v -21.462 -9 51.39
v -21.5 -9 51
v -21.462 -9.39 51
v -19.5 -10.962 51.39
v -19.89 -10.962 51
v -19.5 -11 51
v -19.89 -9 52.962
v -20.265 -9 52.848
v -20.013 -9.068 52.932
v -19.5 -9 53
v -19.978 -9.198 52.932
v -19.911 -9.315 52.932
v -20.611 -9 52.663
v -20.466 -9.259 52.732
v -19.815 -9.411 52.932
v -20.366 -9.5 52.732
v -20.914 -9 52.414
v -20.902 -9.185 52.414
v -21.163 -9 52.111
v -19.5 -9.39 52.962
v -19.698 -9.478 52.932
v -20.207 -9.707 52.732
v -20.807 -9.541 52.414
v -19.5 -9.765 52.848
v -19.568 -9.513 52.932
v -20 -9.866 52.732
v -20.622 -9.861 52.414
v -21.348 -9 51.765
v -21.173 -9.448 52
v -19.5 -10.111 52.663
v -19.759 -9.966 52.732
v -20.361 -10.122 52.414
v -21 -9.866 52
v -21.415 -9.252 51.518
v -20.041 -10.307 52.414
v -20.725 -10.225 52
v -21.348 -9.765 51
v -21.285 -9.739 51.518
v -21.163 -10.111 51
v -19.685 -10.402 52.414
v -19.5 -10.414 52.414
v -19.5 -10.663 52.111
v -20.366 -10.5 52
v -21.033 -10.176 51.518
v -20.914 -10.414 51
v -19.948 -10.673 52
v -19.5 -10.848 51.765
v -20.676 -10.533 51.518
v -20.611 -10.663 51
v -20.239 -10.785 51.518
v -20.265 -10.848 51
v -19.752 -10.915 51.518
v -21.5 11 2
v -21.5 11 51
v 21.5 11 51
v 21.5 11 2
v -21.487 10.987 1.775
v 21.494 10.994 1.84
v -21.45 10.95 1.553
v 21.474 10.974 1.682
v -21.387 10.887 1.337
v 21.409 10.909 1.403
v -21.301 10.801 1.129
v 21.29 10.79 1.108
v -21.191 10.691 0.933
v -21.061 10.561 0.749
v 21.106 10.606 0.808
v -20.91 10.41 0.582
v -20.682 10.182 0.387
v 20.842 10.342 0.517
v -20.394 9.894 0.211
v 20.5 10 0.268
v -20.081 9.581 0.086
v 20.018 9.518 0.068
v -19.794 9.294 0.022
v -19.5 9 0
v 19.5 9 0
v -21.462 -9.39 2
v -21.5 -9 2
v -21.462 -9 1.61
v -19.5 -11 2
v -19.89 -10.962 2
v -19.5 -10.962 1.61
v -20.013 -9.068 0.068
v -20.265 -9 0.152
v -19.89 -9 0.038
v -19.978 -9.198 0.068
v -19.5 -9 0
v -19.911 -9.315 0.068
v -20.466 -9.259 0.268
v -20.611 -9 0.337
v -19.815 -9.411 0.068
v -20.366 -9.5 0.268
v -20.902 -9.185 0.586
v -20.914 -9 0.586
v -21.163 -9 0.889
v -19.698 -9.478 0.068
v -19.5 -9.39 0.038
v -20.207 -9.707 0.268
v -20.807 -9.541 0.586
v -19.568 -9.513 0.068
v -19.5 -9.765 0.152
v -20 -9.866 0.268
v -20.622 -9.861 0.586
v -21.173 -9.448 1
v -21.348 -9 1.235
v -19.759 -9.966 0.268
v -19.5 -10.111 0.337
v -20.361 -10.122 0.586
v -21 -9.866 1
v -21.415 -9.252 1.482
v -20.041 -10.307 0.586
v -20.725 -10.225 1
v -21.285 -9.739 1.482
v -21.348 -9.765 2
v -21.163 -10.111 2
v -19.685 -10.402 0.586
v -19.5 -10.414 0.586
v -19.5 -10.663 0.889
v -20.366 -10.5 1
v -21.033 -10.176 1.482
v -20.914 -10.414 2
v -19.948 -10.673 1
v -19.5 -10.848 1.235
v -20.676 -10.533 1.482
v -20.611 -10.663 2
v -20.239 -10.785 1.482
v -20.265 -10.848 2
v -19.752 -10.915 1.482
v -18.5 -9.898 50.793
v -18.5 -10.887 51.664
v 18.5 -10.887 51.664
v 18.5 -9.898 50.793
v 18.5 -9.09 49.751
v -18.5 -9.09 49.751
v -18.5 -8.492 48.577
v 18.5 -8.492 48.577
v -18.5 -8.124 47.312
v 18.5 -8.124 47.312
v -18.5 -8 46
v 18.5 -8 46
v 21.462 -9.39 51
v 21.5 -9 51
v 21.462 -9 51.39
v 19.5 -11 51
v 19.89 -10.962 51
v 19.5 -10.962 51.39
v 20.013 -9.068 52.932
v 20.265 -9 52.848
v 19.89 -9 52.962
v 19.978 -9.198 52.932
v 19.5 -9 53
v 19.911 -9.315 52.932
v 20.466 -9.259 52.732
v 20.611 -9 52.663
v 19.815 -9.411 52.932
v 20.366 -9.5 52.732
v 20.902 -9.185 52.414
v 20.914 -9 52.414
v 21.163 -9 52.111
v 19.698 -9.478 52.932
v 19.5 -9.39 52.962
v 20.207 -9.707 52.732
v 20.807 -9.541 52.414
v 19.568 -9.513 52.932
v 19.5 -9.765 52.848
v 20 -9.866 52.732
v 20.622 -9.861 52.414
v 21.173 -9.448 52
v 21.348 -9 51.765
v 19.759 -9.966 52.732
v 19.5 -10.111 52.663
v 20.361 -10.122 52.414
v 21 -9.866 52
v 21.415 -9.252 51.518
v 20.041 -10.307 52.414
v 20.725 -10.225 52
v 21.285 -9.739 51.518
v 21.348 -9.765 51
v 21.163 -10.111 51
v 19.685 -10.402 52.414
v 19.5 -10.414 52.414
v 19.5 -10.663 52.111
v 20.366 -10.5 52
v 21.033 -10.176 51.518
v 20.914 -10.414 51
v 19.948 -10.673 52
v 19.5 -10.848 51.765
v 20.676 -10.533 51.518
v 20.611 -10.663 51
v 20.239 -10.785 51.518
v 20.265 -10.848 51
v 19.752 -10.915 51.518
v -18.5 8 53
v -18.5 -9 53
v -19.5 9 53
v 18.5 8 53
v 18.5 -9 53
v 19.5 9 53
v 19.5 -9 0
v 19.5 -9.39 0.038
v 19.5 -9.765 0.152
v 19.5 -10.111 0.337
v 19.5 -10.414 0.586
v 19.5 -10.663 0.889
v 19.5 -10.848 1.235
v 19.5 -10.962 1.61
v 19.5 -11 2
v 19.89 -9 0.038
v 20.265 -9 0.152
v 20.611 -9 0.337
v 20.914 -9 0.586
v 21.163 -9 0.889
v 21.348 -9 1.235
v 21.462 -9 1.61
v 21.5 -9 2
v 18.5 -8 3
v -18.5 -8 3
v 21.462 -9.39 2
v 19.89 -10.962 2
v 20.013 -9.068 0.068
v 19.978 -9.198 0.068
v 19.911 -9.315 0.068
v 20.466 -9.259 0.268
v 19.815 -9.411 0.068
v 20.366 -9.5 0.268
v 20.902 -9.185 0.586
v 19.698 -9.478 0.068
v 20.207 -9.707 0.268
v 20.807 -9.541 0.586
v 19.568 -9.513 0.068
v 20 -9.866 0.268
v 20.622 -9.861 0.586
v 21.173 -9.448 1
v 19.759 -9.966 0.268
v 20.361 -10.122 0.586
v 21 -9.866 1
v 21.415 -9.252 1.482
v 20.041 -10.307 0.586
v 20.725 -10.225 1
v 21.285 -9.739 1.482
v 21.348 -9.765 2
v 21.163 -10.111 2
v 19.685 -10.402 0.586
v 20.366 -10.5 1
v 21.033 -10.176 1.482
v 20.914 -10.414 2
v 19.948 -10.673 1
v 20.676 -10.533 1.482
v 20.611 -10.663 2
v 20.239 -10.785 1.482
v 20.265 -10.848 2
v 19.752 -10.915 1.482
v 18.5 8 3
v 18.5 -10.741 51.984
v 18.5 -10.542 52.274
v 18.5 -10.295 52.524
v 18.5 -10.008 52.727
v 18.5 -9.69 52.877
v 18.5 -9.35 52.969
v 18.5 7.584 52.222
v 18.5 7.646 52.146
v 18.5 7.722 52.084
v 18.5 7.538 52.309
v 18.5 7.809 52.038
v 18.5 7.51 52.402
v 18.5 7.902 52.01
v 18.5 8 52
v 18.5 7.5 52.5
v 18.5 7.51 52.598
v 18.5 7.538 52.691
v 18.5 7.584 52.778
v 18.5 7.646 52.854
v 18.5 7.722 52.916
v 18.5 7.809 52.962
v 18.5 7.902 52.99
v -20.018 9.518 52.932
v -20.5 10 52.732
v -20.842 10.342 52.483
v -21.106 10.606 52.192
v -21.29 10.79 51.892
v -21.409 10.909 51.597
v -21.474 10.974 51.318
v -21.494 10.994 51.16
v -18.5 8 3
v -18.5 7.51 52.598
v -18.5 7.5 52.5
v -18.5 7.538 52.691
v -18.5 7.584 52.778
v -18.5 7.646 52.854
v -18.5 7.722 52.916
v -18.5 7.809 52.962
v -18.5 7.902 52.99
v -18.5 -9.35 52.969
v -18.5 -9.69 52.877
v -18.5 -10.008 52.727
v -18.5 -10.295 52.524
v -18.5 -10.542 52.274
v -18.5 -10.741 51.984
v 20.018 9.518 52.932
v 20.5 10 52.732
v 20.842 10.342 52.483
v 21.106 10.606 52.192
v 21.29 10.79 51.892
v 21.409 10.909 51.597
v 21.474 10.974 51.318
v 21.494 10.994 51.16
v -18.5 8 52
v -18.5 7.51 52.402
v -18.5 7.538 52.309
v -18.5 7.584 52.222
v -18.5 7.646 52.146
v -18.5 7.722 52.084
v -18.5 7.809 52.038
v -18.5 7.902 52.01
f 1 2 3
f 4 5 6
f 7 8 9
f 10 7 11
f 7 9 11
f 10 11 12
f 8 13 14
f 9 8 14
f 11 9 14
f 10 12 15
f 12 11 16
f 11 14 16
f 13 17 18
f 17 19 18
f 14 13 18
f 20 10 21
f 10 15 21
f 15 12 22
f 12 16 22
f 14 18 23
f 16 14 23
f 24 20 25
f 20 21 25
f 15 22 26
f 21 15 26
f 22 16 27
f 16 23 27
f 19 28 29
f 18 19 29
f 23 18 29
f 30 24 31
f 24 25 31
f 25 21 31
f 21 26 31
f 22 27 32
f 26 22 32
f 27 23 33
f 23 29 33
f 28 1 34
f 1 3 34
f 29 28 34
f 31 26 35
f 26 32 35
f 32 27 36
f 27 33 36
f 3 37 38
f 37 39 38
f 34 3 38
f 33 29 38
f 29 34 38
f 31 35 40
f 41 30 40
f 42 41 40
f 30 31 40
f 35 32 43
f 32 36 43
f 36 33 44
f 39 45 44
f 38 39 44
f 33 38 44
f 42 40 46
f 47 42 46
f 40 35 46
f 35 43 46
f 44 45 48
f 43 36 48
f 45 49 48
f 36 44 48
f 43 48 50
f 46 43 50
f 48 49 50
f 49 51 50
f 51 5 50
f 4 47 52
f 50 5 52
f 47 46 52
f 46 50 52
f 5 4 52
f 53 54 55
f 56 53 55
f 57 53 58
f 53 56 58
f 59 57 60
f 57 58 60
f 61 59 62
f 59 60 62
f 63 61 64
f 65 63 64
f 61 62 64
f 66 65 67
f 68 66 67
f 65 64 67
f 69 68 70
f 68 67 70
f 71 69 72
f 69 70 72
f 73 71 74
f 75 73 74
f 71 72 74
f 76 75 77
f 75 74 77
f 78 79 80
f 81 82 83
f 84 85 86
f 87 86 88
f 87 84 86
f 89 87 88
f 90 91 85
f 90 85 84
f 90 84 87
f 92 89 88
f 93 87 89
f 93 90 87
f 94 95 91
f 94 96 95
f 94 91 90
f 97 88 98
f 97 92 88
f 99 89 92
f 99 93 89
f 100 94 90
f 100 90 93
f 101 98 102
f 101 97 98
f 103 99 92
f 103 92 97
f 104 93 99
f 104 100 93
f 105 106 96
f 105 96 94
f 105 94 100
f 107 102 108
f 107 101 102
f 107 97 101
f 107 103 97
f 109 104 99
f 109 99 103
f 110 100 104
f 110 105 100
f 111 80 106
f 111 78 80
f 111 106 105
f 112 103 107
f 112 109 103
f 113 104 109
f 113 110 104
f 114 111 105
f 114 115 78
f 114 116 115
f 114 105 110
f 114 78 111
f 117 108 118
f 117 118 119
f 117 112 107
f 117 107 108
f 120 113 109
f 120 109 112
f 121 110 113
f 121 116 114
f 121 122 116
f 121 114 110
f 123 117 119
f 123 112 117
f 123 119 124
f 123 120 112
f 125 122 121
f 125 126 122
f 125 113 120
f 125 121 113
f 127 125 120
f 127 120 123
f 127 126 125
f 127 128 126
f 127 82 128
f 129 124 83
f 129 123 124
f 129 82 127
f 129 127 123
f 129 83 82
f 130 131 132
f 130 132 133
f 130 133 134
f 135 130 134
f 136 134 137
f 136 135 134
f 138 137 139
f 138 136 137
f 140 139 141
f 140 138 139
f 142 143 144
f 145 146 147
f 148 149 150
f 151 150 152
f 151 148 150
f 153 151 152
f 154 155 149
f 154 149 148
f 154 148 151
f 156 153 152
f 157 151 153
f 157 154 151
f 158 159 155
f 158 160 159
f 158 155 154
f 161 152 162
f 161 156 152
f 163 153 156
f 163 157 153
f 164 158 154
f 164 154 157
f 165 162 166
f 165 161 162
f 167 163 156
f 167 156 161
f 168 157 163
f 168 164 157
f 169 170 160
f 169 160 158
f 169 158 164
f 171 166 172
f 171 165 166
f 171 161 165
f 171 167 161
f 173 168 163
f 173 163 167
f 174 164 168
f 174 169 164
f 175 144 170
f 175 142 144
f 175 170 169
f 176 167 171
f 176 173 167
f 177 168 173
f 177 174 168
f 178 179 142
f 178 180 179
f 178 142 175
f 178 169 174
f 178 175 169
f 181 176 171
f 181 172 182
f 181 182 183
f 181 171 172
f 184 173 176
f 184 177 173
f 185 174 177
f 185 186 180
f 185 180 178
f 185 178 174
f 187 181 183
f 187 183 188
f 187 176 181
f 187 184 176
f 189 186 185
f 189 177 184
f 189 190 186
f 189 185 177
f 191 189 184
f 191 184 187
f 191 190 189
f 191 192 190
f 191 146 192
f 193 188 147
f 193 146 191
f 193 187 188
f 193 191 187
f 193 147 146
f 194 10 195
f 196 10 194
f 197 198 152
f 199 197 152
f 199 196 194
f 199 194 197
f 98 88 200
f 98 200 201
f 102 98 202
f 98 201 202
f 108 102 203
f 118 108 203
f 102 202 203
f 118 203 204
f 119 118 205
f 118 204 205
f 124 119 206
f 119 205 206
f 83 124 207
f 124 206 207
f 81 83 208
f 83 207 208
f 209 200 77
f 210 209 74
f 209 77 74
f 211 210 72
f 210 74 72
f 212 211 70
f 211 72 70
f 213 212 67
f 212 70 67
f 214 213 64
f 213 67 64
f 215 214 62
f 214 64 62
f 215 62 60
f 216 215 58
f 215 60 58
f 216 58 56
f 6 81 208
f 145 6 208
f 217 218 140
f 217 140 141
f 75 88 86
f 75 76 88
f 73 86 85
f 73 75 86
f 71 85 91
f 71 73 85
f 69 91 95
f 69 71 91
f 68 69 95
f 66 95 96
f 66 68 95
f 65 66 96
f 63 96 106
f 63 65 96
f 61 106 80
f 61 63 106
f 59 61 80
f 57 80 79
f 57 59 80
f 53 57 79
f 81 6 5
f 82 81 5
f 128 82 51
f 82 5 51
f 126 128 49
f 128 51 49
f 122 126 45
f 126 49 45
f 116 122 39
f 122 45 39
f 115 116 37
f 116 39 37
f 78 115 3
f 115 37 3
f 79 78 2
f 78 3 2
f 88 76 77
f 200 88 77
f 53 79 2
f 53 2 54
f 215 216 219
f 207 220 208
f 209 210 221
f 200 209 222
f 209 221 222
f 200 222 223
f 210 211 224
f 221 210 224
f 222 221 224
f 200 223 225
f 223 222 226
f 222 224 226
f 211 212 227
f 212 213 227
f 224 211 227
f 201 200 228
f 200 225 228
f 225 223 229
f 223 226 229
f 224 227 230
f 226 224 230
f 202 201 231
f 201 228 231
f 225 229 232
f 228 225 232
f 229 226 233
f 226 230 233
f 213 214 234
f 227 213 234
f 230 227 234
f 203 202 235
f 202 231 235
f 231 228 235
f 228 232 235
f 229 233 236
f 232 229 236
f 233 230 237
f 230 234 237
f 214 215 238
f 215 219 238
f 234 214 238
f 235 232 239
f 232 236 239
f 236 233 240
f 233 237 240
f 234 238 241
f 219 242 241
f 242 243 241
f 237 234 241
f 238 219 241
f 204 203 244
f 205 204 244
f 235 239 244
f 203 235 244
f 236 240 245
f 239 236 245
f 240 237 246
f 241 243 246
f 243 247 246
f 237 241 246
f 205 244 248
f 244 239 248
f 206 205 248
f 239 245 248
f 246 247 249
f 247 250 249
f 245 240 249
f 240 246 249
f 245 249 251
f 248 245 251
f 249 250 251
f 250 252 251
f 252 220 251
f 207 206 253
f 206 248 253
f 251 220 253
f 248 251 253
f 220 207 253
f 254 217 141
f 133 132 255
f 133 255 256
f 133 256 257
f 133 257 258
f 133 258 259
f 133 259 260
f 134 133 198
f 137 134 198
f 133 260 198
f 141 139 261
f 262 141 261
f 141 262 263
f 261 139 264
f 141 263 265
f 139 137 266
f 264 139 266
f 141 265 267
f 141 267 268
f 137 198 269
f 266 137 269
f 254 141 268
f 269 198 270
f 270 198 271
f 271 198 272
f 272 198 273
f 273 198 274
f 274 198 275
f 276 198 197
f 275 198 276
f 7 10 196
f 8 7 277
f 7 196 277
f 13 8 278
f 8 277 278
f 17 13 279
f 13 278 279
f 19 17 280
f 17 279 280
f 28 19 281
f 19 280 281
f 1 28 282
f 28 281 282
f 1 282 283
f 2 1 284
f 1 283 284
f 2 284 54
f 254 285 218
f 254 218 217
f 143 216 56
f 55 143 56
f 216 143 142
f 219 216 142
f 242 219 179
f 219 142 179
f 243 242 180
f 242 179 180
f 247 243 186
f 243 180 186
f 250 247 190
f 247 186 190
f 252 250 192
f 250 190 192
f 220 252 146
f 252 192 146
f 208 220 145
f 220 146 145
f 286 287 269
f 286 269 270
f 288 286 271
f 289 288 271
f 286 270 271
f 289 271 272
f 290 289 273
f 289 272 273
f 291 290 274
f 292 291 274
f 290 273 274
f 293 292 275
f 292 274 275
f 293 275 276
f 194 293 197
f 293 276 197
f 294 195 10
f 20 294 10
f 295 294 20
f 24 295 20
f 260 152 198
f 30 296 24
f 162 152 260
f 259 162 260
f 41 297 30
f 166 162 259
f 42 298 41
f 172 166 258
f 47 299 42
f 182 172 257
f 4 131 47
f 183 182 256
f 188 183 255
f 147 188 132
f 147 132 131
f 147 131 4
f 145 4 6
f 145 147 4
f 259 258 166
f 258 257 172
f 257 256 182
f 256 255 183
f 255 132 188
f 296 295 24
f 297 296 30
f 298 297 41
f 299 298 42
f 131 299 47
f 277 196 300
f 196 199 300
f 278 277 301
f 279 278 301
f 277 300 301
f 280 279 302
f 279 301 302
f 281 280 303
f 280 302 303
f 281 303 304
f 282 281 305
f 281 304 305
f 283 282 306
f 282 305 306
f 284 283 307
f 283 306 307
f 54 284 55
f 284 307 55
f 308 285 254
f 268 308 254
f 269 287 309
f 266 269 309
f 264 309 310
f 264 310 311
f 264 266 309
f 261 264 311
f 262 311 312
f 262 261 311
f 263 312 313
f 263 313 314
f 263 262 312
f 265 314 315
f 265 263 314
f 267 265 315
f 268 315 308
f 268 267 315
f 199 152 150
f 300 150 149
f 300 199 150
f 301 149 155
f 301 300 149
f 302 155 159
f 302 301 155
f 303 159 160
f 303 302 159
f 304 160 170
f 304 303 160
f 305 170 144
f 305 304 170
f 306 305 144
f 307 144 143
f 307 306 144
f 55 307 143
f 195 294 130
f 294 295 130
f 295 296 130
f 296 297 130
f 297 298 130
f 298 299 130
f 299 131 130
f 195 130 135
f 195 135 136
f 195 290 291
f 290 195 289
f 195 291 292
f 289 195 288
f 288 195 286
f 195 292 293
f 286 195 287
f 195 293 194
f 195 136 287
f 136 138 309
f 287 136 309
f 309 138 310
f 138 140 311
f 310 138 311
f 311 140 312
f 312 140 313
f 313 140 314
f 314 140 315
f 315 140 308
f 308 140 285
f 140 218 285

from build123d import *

# Parameters (mm, degrees)
F0_W        = 43
F0_H        = 22
F1_DEPTH    = 53
F2_T        = -3
F3_W        = 37
F3_H        = 0.5
F4_DEPTH    = 1
F5_R        = 0.49999
F6_R        = 2
F7_T1_DEPTH = 37


# Not quite as in the source:
# - a fillet or chamfer that OpenCascade refuses, or shapes differently, is made with other operations: its cross-section is extruded or revolved along the edge and cut away or added
# - a fillet or chamfer is up to 0.001 mm smaller than in the source, because OpenCascade refuses the exact size


with BuildPart() as f1:
    # F0 (on Top) → F1 (new body)
    with BuildSketch(Plane.XY):
        Rectangle(F0_W, F0_H)
    extrude(amount=F1_DEPTH)

    # F2
    f2_openings = [f1.faces().sort_by_distance(p)[0] for p in [
        (0, 0, 53),
    ]]
    offset(amount=F2_T, openings=f2_openings)

    # F3 (on face) → F4 (join)
    with BuildSketch(Plane.XY.offset(53)):
        with Locations((0, 7.75)):
            Rectangle(F3_W, F3_H)
    extrude(amount=-F4_DEPTH)

    # F5 (radius 0.5 in the source; OpenCascade refuses exactly that, so slightly less here)
    f5_edges = [f1.edges().sort_by_distance(p)[0] for p in [
        (0, 7.5, 53),
        (0, 7.5, 52),
    ]]
    fillet(f5_edges, radius=F5_R)

    # F6
    f6_edges = [f1.edges().sort_by_distance(p)[0] for p in [
        (21.5, -11, 26.5),
        (-21.5, -11, 26.5),
        (21.5, 0, 0),
        (0, 11, 0),
        (-21.5, 0, 0),
        (0, -11, 0),
        (-21.5, 0, 53),
        (0, 11, 53),
        (21.5, 0, 53),
        (0, -11, 53),
    ]]
    fillet(f6_edges, radius=F6_R)

    # F7: fillet of radius 7 on 1 edges, made by hand

    # F7_s2 → F7_t1 (cut)
    with BuildSketch(Plane.YZ.offset(-18.5)):
        with BuildLine():
            ThreePointArc((-15, 53), (-10.0502525317, 50.9497474683), (-8, 46))
            Line((-8, 46), (-7.86, 46))
            Line((-7.86, 46), (-7.86, 53.14))
            Line((-7.86, 53.14), (-15, 53.14))
            Line((-15, 53.14), (-15, 53))
        make_face()
    extrude(amount=F7_T1_DEPTH, mode=Mode.SUBTRACT)


solid = f1.part
